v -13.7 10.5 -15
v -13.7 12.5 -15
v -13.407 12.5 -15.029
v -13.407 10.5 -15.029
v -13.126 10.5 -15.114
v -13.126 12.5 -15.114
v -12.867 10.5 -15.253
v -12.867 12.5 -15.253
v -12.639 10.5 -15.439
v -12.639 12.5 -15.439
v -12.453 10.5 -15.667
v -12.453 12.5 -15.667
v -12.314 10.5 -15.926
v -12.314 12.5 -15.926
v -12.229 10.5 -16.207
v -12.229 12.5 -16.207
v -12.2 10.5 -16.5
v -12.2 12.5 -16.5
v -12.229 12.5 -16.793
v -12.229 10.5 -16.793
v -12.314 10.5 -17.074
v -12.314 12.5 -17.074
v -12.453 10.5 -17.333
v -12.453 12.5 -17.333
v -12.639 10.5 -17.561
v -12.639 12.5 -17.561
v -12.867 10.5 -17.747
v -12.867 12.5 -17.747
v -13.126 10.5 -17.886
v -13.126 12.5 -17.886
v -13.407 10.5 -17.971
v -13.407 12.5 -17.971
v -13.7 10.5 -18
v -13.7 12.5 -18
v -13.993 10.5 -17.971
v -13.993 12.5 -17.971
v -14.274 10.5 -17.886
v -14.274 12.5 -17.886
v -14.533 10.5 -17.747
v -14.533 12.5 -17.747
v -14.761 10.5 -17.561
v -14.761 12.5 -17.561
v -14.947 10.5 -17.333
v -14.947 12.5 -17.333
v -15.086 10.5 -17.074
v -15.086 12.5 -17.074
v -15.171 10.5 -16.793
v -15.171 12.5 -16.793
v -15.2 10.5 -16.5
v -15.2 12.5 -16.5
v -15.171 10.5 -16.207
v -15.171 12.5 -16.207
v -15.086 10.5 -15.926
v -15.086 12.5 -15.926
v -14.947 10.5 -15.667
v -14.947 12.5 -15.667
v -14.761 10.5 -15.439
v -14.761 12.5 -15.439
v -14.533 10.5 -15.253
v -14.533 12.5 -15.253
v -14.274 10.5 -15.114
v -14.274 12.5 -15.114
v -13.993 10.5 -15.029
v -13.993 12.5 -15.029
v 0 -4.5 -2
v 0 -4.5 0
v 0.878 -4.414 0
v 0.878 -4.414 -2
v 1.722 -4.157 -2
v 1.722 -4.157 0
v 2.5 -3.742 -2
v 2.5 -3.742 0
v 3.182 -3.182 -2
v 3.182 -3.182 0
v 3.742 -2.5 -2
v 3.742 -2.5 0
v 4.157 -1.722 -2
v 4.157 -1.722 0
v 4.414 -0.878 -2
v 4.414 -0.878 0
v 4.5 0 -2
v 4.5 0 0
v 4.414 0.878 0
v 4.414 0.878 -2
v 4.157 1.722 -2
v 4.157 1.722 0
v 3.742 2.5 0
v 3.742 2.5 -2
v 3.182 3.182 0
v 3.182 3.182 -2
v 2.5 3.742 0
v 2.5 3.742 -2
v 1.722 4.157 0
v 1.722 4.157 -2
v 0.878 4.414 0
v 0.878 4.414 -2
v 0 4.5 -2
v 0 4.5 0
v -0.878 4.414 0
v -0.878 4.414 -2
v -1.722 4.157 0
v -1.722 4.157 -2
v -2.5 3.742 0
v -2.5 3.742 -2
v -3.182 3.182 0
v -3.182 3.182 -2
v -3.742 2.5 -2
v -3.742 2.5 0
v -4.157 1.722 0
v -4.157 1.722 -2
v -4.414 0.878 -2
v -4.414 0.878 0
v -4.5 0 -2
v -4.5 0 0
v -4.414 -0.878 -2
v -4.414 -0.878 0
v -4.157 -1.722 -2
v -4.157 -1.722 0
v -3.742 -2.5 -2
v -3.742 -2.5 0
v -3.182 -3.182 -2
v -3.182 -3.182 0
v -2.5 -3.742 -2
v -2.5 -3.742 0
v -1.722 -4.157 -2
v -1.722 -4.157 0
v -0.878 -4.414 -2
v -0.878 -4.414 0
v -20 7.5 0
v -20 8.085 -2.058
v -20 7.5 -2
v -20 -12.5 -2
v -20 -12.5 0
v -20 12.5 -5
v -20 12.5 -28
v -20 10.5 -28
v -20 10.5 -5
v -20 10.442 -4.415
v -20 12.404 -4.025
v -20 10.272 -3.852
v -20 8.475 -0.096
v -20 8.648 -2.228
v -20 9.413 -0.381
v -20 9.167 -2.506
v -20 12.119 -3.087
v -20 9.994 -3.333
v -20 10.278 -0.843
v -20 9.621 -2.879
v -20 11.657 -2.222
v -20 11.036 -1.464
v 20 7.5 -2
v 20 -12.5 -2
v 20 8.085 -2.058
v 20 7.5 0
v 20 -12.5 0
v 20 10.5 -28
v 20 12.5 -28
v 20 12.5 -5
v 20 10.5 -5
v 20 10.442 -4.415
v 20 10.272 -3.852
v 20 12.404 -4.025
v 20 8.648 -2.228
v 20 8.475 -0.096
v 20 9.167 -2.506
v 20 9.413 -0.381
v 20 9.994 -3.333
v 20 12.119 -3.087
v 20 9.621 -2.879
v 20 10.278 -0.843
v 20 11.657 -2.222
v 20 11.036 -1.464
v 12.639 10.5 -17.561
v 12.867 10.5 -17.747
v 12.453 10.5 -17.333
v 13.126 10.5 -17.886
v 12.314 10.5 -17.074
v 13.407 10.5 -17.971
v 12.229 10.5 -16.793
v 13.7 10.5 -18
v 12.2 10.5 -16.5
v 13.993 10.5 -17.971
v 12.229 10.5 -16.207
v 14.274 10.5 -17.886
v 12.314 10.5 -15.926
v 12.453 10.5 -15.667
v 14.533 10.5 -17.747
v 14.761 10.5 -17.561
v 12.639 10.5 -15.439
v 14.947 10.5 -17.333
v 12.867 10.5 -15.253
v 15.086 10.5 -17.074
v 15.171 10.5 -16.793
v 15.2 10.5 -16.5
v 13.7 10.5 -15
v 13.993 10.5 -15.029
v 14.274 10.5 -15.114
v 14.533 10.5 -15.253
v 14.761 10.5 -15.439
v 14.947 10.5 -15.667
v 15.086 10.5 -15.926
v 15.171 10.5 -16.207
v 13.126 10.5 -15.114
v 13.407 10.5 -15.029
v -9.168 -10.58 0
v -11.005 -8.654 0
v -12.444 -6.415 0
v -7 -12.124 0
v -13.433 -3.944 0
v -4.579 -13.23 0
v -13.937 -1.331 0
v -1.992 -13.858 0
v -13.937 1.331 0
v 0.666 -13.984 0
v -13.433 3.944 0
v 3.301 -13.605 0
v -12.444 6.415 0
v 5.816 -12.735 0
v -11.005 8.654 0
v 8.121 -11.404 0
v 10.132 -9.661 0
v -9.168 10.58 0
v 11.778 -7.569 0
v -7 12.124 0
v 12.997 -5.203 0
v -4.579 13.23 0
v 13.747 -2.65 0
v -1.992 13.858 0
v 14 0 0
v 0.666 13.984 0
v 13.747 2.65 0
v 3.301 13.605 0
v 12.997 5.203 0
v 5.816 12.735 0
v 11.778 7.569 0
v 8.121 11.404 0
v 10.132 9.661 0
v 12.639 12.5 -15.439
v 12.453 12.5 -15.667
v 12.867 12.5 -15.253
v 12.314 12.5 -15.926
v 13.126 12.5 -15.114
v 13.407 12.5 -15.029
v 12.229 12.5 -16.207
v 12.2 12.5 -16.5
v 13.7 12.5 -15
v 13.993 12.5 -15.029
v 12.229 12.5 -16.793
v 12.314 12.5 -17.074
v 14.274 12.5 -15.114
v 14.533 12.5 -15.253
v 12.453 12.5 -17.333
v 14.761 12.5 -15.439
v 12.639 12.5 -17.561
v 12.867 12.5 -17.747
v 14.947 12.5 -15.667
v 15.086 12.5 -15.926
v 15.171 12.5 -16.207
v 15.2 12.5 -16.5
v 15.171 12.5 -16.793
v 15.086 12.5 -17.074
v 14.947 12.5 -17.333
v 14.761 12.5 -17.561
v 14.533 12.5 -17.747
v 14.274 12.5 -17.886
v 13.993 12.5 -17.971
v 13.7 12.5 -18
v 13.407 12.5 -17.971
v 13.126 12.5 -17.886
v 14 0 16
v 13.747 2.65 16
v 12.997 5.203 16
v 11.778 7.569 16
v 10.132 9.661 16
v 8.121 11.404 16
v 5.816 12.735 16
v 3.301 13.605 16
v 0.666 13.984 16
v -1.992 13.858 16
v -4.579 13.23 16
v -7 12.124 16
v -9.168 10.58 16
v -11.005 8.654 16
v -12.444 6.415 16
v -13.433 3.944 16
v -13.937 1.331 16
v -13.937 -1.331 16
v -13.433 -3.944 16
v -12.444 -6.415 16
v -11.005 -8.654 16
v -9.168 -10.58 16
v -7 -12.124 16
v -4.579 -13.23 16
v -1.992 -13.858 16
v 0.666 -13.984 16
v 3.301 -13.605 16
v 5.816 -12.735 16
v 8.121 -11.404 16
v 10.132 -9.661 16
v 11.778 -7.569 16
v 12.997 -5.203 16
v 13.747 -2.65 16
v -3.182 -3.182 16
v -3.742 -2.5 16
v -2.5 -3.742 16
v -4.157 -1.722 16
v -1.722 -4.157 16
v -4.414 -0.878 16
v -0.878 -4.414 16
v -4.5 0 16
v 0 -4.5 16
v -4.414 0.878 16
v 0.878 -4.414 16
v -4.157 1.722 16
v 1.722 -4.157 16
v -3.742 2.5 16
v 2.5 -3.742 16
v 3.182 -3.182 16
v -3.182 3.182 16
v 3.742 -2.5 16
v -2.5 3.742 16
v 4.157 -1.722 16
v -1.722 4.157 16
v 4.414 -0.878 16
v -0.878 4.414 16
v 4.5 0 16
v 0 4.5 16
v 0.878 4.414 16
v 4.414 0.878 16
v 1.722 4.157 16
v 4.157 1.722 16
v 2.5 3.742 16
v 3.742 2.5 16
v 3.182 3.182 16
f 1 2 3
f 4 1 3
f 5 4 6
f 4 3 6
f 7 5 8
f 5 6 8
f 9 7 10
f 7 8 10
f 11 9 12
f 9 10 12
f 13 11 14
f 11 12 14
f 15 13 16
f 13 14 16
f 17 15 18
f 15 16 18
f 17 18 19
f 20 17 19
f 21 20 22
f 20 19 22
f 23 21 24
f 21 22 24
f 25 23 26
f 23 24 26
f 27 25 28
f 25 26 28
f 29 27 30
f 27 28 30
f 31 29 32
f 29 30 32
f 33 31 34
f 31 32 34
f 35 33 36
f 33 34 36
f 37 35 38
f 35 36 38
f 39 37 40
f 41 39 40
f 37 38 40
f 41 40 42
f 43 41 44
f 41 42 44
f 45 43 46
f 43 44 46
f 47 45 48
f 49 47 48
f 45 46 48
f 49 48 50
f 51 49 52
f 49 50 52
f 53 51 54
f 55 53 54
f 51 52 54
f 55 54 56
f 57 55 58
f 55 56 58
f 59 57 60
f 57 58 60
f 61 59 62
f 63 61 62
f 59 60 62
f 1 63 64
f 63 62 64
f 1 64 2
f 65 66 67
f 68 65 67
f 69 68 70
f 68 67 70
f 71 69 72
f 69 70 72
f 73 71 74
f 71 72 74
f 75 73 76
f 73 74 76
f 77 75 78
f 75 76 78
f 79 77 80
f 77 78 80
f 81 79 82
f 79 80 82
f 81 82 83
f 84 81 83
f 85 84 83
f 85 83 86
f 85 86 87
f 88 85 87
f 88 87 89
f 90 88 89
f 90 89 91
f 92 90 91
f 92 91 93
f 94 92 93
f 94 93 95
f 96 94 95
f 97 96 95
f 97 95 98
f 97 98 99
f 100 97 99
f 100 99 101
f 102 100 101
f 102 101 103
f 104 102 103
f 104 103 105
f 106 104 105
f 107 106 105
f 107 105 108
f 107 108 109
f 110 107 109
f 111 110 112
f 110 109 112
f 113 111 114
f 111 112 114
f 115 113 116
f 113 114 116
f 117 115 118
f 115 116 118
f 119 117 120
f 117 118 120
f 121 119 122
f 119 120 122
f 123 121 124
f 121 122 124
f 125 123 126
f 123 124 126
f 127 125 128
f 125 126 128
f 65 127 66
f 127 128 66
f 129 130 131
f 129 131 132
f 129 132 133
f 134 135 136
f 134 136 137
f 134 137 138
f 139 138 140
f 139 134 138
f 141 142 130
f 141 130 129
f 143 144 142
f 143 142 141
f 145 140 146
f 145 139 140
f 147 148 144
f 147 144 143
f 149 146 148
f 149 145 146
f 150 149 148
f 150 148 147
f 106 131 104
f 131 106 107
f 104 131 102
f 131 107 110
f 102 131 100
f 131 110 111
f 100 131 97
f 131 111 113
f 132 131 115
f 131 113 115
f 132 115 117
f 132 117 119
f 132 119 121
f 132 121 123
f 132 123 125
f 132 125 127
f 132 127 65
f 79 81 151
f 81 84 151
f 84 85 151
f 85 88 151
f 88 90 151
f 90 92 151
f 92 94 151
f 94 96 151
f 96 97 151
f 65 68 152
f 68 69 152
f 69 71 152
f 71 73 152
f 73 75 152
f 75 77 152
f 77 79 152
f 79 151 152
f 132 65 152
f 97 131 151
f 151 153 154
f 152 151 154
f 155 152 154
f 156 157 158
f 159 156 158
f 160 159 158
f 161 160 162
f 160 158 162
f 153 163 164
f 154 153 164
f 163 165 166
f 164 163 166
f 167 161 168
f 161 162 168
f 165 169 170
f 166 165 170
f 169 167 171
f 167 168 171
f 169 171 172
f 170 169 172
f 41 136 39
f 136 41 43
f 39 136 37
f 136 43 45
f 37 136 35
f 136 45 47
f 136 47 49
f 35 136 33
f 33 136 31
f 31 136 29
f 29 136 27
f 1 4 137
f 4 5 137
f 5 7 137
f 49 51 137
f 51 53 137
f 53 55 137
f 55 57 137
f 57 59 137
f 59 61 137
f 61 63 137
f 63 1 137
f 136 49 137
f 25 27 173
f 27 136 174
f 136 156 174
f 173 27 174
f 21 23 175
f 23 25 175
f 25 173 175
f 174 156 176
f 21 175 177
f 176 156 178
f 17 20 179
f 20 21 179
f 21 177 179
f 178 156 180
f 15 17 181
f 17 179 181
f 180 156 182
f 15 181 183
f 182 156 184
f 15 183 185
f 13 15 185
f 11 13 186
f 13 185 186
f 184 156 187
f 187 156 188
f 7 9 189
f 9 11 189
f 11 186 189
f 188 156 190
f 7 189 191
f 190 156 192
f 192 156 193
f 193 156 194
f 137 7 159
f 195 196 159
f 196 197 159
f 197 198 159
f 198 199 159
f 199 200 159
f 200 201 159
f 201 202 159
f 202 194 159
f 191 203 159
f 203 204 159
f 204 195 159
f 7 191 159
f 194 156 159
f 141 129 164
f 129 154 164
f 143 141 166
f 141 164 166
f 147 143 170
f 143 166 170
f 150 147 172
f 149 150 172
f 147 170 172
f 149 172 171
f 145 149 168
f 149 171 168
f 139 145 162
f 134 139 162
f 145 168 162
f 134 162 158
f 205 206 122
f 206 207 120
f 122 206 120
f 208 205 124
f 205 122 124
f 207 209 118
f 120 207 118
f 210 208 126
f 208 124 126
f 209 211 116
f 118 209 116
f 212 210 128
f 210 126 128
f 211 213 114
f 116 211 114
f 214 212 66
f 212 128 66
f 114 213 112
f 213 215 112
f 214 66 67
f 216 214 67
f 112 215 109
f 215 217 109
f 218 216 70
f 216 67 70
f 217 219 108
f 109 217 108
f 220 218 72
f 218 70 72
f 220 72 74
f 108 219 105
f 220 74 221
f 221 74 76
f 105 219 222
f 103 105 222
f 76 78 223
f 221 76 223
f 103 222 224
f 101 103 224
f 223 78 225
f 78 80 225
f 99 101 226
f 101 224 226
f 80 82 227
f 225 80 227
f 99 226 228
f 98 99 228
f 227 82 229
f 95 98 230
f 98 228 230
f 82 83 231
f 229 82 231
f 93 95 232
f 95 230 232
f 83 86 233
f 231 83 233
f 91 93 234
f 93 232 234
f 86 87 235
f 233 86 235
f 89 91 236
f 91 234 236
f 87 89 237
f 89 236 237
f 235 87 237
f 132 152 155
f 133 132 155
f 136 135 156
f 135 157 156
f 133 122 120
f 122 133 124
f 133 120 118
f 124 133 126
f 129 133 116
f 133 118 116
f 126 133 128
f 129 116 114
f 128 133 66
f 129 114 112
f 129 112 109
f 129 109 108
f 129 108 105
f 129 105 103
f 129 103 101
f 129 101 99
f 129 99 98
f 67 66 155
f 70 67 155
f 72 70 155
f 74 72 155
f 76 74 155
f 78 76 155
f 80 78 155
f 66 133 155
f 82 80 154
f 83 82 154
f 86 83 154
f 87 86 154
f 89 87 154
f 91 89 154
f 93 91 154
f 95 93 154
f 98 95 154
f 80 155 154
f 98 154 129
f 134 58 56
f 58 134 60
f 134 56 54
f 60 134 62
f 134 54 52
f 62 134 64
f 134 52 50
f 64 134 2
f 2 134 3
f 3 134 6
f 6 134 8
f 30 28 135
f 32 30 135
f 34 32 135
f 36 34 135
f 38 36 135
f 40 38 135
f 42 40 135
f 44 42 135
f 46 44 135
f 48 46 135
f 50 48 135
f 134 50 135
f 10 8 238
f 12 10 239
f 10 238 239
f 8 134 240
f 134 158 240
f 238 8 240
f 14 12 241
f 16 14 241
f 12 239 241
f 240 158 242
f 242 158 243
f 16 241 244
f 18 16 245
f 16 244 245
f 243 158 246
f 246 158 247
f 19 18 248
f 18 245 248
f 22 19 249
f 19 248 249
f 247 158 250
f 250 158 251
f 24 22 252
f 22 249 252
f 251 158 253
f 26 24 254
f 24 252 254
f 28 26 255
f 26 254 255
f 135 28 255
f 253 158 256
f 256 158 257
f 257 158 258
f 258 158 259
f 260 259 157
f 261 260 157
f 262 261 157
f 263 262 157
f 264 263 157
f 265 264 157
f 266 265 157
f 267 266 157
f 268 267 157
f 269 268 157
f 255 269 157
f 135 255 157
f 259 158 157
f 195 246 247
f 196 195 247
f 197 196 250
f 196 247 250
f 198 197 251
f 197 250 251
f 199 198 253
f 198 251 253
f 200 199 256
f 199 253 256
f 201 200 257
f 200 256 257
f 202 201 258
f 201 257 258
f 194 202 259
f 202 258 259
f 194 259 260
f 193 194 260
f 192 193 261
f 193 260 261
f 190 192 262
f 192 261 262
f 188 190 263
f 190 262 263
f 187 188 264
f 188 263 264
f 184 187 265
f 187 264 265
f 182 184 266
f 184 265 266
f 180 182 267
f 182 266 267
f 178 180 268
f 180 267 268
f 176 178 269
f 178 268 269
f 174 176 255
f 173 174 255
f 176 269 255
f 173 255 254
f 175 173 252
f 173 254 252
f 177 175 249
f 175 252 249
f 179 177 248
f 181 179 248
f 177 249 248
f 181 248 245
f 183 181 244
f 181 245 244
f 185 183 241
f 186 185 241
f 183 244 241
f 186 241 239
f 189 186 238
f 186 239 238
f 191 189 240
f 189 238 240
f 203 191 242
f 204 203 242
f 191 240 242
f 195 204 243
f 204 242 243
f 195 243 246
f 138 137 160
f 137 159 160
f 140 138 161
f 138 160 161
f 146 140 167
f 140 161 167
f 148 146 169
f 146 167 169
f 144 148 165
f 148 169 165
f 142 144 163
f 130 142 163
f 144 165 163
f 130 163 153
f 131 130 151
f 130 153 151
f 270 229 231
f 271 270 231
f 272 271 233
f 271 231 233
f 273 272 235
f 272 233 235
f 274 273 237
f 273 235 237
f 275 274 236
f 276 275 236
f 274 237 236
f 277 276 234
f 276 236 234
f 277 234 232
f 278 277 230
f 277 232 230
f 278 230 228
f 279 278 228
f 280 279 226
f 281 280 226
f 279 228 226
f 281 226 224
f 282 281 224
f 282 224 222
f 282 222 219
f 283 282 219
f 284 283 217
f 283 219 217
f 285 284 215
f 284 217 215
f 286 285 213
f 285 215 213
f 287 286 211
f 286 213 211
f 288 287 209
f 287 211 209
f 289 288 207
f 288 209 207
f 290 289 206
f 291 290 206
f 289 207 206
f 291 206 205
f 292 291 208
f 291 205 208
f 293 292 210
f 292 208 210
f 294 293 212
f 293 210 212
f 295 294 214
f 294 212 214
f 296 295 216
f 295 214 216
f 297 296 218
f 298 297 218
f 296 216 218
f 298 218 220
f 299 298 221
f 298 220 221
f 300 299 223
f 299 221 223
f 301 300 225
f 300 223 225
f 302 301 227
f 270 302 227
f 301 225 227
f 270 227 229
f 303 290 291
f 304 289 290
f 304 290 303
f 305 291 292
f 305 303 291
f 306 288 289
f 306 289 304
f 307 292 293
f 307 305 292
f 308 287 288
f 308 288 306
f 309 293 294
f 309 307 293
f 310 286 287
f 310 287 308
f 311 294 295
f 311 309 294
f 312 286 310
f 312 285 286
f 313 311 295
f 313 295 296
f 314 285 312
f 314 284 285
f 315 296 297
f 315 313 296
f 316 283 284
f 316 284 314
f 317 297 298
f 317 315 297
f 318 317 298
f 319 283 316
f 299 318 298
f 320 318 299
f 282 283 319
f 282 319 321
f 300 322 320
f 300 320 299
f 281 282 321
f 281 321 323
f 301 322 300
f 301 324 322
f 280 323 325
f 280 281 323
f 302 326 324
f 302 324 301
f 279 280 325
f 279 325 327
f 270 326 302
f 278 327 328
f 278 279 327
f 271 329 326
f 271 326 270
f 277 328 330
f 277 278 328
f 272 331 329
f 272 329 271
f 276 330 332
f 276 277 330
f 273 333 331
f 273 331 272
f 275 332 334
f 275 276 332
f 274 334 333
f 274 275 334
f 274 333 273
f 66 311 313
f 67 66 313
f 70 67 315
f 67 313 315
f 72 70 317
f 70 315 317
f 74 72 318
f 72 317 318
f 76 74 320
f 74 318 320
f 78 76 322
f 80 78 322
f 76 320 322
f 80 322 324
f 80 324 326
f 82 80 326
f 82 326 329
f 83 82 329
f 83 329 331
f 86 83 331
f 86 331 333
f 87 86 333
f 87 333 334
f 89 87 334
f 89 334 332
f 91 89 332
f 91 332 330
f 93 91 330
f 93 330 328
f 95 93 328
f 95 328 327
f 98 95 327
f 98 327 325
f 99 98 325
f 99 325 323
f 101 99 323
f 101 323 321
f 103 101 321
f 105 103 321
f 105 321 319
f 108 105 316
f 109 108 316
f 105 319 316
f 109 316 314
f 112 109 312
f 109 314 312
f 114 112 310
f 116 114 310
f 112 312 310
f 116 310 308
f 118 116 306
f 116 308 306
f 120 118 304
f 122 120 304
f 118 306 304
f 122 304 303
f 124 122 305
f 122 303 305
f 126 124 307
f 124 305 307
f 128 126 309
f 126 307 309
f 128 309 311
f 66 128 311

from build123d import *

# Parameters (mm, degrees)
SKETCH1_R           = 14
BOSS_EXTRUDE1_DEPTH = 16
BASE_FLANGE1_DEPTH  = 20
SKETCH8_R           = 1.5
CUT_EXTRUDE1_DEPTH  = 2
SKETCH9_R           = 4.5
CUT_EXTRUDE2_DEPTH  = 51.318982502


# Sheet-metal steps are written as plain solids
with BuildPart() as part:
    # Sketch1 → Boss-Extrude1 (new body)
    with BuildSketch(Plane.XY):
        Circle(SKETCH1_R)
    extrude(amount=BOSS_EXTRUDE1_DEPTH)


with BuildPart() as body_2:
    # Sketch3 → Base-Flange1 (new, symmetric)
    with BuildSketch(Plane(origin=(0, 0, 0), x_dir=(0, 0, -1), z_dir=(1, 0, 0))):
        with BuildLine():
            Line((0, -12.5), (0, 7.5))
            ThreePointArc((0, 7.5), (1.464466094, 11.035533906), (5, 12.5))
            Line((5, 12.5), (28, 12.5))
            Line((28, 12.5), (28, 10.5))
            Line((28, 10.5), (5, 10.5))
            ThreePointArc((5, 10.5), (2.878679656, 9.621320344), (2, 7.5))
            Line((2, 7.5), (2, -12.5))
            Line((2, -12.5), (0, -12.5))
        make_face()
    extrude(amount=BASE_FLANGE1_DEPTH, both=True)

    # Sketch8 → Cut-Extrude1 (cut)
    with BuildSketch(Plane(origin=(0, 12.5, 0), x_dir=(1, 0, 0), z_dir=(0, 1, 0))):
        with Locations(Location((-13.7, 16.5, 0), (0, 0, 270))):
            Circle(SKETCH8_R)
        with Locations(Location((13.7, 16.5, 0), (0, 0, 270))):
            Circle(SKETCH8_R)
    extrude(amount=-CUT_EXTRUDE1_DEPTH, mode=Mode.SUBTRACT)


with BuildPart() as cut_extrude2_tool:
    # Sketch9 → Cut-Extrude2 (new, through all)
    with BuildSketch(Plane.XY.offset(16)):
        with Locations(Location((0, 0, 0), (0, 0, 270))):
            Circle(SKETCH9_R)
    extrude(amount=-CUT_EXTRUDE2_DEPTH)


with BuildPart() as part_1:
    add(part.part)

    # Cut-Extrude2: cut by cut_extrude2_tool
    add(cut_extrude2_tool.part, mode=Mode.SUBTRACT)


with BuildPart() as body_2_1:
    add(body_2.part)

    # Cut-Extrude2: cut by cut_extrude2_tool
    add(cut_extrude2_tool.part, mode=Mode.SUBTRACT)


solid = Compound([part_1.part, body_2_1.part])
